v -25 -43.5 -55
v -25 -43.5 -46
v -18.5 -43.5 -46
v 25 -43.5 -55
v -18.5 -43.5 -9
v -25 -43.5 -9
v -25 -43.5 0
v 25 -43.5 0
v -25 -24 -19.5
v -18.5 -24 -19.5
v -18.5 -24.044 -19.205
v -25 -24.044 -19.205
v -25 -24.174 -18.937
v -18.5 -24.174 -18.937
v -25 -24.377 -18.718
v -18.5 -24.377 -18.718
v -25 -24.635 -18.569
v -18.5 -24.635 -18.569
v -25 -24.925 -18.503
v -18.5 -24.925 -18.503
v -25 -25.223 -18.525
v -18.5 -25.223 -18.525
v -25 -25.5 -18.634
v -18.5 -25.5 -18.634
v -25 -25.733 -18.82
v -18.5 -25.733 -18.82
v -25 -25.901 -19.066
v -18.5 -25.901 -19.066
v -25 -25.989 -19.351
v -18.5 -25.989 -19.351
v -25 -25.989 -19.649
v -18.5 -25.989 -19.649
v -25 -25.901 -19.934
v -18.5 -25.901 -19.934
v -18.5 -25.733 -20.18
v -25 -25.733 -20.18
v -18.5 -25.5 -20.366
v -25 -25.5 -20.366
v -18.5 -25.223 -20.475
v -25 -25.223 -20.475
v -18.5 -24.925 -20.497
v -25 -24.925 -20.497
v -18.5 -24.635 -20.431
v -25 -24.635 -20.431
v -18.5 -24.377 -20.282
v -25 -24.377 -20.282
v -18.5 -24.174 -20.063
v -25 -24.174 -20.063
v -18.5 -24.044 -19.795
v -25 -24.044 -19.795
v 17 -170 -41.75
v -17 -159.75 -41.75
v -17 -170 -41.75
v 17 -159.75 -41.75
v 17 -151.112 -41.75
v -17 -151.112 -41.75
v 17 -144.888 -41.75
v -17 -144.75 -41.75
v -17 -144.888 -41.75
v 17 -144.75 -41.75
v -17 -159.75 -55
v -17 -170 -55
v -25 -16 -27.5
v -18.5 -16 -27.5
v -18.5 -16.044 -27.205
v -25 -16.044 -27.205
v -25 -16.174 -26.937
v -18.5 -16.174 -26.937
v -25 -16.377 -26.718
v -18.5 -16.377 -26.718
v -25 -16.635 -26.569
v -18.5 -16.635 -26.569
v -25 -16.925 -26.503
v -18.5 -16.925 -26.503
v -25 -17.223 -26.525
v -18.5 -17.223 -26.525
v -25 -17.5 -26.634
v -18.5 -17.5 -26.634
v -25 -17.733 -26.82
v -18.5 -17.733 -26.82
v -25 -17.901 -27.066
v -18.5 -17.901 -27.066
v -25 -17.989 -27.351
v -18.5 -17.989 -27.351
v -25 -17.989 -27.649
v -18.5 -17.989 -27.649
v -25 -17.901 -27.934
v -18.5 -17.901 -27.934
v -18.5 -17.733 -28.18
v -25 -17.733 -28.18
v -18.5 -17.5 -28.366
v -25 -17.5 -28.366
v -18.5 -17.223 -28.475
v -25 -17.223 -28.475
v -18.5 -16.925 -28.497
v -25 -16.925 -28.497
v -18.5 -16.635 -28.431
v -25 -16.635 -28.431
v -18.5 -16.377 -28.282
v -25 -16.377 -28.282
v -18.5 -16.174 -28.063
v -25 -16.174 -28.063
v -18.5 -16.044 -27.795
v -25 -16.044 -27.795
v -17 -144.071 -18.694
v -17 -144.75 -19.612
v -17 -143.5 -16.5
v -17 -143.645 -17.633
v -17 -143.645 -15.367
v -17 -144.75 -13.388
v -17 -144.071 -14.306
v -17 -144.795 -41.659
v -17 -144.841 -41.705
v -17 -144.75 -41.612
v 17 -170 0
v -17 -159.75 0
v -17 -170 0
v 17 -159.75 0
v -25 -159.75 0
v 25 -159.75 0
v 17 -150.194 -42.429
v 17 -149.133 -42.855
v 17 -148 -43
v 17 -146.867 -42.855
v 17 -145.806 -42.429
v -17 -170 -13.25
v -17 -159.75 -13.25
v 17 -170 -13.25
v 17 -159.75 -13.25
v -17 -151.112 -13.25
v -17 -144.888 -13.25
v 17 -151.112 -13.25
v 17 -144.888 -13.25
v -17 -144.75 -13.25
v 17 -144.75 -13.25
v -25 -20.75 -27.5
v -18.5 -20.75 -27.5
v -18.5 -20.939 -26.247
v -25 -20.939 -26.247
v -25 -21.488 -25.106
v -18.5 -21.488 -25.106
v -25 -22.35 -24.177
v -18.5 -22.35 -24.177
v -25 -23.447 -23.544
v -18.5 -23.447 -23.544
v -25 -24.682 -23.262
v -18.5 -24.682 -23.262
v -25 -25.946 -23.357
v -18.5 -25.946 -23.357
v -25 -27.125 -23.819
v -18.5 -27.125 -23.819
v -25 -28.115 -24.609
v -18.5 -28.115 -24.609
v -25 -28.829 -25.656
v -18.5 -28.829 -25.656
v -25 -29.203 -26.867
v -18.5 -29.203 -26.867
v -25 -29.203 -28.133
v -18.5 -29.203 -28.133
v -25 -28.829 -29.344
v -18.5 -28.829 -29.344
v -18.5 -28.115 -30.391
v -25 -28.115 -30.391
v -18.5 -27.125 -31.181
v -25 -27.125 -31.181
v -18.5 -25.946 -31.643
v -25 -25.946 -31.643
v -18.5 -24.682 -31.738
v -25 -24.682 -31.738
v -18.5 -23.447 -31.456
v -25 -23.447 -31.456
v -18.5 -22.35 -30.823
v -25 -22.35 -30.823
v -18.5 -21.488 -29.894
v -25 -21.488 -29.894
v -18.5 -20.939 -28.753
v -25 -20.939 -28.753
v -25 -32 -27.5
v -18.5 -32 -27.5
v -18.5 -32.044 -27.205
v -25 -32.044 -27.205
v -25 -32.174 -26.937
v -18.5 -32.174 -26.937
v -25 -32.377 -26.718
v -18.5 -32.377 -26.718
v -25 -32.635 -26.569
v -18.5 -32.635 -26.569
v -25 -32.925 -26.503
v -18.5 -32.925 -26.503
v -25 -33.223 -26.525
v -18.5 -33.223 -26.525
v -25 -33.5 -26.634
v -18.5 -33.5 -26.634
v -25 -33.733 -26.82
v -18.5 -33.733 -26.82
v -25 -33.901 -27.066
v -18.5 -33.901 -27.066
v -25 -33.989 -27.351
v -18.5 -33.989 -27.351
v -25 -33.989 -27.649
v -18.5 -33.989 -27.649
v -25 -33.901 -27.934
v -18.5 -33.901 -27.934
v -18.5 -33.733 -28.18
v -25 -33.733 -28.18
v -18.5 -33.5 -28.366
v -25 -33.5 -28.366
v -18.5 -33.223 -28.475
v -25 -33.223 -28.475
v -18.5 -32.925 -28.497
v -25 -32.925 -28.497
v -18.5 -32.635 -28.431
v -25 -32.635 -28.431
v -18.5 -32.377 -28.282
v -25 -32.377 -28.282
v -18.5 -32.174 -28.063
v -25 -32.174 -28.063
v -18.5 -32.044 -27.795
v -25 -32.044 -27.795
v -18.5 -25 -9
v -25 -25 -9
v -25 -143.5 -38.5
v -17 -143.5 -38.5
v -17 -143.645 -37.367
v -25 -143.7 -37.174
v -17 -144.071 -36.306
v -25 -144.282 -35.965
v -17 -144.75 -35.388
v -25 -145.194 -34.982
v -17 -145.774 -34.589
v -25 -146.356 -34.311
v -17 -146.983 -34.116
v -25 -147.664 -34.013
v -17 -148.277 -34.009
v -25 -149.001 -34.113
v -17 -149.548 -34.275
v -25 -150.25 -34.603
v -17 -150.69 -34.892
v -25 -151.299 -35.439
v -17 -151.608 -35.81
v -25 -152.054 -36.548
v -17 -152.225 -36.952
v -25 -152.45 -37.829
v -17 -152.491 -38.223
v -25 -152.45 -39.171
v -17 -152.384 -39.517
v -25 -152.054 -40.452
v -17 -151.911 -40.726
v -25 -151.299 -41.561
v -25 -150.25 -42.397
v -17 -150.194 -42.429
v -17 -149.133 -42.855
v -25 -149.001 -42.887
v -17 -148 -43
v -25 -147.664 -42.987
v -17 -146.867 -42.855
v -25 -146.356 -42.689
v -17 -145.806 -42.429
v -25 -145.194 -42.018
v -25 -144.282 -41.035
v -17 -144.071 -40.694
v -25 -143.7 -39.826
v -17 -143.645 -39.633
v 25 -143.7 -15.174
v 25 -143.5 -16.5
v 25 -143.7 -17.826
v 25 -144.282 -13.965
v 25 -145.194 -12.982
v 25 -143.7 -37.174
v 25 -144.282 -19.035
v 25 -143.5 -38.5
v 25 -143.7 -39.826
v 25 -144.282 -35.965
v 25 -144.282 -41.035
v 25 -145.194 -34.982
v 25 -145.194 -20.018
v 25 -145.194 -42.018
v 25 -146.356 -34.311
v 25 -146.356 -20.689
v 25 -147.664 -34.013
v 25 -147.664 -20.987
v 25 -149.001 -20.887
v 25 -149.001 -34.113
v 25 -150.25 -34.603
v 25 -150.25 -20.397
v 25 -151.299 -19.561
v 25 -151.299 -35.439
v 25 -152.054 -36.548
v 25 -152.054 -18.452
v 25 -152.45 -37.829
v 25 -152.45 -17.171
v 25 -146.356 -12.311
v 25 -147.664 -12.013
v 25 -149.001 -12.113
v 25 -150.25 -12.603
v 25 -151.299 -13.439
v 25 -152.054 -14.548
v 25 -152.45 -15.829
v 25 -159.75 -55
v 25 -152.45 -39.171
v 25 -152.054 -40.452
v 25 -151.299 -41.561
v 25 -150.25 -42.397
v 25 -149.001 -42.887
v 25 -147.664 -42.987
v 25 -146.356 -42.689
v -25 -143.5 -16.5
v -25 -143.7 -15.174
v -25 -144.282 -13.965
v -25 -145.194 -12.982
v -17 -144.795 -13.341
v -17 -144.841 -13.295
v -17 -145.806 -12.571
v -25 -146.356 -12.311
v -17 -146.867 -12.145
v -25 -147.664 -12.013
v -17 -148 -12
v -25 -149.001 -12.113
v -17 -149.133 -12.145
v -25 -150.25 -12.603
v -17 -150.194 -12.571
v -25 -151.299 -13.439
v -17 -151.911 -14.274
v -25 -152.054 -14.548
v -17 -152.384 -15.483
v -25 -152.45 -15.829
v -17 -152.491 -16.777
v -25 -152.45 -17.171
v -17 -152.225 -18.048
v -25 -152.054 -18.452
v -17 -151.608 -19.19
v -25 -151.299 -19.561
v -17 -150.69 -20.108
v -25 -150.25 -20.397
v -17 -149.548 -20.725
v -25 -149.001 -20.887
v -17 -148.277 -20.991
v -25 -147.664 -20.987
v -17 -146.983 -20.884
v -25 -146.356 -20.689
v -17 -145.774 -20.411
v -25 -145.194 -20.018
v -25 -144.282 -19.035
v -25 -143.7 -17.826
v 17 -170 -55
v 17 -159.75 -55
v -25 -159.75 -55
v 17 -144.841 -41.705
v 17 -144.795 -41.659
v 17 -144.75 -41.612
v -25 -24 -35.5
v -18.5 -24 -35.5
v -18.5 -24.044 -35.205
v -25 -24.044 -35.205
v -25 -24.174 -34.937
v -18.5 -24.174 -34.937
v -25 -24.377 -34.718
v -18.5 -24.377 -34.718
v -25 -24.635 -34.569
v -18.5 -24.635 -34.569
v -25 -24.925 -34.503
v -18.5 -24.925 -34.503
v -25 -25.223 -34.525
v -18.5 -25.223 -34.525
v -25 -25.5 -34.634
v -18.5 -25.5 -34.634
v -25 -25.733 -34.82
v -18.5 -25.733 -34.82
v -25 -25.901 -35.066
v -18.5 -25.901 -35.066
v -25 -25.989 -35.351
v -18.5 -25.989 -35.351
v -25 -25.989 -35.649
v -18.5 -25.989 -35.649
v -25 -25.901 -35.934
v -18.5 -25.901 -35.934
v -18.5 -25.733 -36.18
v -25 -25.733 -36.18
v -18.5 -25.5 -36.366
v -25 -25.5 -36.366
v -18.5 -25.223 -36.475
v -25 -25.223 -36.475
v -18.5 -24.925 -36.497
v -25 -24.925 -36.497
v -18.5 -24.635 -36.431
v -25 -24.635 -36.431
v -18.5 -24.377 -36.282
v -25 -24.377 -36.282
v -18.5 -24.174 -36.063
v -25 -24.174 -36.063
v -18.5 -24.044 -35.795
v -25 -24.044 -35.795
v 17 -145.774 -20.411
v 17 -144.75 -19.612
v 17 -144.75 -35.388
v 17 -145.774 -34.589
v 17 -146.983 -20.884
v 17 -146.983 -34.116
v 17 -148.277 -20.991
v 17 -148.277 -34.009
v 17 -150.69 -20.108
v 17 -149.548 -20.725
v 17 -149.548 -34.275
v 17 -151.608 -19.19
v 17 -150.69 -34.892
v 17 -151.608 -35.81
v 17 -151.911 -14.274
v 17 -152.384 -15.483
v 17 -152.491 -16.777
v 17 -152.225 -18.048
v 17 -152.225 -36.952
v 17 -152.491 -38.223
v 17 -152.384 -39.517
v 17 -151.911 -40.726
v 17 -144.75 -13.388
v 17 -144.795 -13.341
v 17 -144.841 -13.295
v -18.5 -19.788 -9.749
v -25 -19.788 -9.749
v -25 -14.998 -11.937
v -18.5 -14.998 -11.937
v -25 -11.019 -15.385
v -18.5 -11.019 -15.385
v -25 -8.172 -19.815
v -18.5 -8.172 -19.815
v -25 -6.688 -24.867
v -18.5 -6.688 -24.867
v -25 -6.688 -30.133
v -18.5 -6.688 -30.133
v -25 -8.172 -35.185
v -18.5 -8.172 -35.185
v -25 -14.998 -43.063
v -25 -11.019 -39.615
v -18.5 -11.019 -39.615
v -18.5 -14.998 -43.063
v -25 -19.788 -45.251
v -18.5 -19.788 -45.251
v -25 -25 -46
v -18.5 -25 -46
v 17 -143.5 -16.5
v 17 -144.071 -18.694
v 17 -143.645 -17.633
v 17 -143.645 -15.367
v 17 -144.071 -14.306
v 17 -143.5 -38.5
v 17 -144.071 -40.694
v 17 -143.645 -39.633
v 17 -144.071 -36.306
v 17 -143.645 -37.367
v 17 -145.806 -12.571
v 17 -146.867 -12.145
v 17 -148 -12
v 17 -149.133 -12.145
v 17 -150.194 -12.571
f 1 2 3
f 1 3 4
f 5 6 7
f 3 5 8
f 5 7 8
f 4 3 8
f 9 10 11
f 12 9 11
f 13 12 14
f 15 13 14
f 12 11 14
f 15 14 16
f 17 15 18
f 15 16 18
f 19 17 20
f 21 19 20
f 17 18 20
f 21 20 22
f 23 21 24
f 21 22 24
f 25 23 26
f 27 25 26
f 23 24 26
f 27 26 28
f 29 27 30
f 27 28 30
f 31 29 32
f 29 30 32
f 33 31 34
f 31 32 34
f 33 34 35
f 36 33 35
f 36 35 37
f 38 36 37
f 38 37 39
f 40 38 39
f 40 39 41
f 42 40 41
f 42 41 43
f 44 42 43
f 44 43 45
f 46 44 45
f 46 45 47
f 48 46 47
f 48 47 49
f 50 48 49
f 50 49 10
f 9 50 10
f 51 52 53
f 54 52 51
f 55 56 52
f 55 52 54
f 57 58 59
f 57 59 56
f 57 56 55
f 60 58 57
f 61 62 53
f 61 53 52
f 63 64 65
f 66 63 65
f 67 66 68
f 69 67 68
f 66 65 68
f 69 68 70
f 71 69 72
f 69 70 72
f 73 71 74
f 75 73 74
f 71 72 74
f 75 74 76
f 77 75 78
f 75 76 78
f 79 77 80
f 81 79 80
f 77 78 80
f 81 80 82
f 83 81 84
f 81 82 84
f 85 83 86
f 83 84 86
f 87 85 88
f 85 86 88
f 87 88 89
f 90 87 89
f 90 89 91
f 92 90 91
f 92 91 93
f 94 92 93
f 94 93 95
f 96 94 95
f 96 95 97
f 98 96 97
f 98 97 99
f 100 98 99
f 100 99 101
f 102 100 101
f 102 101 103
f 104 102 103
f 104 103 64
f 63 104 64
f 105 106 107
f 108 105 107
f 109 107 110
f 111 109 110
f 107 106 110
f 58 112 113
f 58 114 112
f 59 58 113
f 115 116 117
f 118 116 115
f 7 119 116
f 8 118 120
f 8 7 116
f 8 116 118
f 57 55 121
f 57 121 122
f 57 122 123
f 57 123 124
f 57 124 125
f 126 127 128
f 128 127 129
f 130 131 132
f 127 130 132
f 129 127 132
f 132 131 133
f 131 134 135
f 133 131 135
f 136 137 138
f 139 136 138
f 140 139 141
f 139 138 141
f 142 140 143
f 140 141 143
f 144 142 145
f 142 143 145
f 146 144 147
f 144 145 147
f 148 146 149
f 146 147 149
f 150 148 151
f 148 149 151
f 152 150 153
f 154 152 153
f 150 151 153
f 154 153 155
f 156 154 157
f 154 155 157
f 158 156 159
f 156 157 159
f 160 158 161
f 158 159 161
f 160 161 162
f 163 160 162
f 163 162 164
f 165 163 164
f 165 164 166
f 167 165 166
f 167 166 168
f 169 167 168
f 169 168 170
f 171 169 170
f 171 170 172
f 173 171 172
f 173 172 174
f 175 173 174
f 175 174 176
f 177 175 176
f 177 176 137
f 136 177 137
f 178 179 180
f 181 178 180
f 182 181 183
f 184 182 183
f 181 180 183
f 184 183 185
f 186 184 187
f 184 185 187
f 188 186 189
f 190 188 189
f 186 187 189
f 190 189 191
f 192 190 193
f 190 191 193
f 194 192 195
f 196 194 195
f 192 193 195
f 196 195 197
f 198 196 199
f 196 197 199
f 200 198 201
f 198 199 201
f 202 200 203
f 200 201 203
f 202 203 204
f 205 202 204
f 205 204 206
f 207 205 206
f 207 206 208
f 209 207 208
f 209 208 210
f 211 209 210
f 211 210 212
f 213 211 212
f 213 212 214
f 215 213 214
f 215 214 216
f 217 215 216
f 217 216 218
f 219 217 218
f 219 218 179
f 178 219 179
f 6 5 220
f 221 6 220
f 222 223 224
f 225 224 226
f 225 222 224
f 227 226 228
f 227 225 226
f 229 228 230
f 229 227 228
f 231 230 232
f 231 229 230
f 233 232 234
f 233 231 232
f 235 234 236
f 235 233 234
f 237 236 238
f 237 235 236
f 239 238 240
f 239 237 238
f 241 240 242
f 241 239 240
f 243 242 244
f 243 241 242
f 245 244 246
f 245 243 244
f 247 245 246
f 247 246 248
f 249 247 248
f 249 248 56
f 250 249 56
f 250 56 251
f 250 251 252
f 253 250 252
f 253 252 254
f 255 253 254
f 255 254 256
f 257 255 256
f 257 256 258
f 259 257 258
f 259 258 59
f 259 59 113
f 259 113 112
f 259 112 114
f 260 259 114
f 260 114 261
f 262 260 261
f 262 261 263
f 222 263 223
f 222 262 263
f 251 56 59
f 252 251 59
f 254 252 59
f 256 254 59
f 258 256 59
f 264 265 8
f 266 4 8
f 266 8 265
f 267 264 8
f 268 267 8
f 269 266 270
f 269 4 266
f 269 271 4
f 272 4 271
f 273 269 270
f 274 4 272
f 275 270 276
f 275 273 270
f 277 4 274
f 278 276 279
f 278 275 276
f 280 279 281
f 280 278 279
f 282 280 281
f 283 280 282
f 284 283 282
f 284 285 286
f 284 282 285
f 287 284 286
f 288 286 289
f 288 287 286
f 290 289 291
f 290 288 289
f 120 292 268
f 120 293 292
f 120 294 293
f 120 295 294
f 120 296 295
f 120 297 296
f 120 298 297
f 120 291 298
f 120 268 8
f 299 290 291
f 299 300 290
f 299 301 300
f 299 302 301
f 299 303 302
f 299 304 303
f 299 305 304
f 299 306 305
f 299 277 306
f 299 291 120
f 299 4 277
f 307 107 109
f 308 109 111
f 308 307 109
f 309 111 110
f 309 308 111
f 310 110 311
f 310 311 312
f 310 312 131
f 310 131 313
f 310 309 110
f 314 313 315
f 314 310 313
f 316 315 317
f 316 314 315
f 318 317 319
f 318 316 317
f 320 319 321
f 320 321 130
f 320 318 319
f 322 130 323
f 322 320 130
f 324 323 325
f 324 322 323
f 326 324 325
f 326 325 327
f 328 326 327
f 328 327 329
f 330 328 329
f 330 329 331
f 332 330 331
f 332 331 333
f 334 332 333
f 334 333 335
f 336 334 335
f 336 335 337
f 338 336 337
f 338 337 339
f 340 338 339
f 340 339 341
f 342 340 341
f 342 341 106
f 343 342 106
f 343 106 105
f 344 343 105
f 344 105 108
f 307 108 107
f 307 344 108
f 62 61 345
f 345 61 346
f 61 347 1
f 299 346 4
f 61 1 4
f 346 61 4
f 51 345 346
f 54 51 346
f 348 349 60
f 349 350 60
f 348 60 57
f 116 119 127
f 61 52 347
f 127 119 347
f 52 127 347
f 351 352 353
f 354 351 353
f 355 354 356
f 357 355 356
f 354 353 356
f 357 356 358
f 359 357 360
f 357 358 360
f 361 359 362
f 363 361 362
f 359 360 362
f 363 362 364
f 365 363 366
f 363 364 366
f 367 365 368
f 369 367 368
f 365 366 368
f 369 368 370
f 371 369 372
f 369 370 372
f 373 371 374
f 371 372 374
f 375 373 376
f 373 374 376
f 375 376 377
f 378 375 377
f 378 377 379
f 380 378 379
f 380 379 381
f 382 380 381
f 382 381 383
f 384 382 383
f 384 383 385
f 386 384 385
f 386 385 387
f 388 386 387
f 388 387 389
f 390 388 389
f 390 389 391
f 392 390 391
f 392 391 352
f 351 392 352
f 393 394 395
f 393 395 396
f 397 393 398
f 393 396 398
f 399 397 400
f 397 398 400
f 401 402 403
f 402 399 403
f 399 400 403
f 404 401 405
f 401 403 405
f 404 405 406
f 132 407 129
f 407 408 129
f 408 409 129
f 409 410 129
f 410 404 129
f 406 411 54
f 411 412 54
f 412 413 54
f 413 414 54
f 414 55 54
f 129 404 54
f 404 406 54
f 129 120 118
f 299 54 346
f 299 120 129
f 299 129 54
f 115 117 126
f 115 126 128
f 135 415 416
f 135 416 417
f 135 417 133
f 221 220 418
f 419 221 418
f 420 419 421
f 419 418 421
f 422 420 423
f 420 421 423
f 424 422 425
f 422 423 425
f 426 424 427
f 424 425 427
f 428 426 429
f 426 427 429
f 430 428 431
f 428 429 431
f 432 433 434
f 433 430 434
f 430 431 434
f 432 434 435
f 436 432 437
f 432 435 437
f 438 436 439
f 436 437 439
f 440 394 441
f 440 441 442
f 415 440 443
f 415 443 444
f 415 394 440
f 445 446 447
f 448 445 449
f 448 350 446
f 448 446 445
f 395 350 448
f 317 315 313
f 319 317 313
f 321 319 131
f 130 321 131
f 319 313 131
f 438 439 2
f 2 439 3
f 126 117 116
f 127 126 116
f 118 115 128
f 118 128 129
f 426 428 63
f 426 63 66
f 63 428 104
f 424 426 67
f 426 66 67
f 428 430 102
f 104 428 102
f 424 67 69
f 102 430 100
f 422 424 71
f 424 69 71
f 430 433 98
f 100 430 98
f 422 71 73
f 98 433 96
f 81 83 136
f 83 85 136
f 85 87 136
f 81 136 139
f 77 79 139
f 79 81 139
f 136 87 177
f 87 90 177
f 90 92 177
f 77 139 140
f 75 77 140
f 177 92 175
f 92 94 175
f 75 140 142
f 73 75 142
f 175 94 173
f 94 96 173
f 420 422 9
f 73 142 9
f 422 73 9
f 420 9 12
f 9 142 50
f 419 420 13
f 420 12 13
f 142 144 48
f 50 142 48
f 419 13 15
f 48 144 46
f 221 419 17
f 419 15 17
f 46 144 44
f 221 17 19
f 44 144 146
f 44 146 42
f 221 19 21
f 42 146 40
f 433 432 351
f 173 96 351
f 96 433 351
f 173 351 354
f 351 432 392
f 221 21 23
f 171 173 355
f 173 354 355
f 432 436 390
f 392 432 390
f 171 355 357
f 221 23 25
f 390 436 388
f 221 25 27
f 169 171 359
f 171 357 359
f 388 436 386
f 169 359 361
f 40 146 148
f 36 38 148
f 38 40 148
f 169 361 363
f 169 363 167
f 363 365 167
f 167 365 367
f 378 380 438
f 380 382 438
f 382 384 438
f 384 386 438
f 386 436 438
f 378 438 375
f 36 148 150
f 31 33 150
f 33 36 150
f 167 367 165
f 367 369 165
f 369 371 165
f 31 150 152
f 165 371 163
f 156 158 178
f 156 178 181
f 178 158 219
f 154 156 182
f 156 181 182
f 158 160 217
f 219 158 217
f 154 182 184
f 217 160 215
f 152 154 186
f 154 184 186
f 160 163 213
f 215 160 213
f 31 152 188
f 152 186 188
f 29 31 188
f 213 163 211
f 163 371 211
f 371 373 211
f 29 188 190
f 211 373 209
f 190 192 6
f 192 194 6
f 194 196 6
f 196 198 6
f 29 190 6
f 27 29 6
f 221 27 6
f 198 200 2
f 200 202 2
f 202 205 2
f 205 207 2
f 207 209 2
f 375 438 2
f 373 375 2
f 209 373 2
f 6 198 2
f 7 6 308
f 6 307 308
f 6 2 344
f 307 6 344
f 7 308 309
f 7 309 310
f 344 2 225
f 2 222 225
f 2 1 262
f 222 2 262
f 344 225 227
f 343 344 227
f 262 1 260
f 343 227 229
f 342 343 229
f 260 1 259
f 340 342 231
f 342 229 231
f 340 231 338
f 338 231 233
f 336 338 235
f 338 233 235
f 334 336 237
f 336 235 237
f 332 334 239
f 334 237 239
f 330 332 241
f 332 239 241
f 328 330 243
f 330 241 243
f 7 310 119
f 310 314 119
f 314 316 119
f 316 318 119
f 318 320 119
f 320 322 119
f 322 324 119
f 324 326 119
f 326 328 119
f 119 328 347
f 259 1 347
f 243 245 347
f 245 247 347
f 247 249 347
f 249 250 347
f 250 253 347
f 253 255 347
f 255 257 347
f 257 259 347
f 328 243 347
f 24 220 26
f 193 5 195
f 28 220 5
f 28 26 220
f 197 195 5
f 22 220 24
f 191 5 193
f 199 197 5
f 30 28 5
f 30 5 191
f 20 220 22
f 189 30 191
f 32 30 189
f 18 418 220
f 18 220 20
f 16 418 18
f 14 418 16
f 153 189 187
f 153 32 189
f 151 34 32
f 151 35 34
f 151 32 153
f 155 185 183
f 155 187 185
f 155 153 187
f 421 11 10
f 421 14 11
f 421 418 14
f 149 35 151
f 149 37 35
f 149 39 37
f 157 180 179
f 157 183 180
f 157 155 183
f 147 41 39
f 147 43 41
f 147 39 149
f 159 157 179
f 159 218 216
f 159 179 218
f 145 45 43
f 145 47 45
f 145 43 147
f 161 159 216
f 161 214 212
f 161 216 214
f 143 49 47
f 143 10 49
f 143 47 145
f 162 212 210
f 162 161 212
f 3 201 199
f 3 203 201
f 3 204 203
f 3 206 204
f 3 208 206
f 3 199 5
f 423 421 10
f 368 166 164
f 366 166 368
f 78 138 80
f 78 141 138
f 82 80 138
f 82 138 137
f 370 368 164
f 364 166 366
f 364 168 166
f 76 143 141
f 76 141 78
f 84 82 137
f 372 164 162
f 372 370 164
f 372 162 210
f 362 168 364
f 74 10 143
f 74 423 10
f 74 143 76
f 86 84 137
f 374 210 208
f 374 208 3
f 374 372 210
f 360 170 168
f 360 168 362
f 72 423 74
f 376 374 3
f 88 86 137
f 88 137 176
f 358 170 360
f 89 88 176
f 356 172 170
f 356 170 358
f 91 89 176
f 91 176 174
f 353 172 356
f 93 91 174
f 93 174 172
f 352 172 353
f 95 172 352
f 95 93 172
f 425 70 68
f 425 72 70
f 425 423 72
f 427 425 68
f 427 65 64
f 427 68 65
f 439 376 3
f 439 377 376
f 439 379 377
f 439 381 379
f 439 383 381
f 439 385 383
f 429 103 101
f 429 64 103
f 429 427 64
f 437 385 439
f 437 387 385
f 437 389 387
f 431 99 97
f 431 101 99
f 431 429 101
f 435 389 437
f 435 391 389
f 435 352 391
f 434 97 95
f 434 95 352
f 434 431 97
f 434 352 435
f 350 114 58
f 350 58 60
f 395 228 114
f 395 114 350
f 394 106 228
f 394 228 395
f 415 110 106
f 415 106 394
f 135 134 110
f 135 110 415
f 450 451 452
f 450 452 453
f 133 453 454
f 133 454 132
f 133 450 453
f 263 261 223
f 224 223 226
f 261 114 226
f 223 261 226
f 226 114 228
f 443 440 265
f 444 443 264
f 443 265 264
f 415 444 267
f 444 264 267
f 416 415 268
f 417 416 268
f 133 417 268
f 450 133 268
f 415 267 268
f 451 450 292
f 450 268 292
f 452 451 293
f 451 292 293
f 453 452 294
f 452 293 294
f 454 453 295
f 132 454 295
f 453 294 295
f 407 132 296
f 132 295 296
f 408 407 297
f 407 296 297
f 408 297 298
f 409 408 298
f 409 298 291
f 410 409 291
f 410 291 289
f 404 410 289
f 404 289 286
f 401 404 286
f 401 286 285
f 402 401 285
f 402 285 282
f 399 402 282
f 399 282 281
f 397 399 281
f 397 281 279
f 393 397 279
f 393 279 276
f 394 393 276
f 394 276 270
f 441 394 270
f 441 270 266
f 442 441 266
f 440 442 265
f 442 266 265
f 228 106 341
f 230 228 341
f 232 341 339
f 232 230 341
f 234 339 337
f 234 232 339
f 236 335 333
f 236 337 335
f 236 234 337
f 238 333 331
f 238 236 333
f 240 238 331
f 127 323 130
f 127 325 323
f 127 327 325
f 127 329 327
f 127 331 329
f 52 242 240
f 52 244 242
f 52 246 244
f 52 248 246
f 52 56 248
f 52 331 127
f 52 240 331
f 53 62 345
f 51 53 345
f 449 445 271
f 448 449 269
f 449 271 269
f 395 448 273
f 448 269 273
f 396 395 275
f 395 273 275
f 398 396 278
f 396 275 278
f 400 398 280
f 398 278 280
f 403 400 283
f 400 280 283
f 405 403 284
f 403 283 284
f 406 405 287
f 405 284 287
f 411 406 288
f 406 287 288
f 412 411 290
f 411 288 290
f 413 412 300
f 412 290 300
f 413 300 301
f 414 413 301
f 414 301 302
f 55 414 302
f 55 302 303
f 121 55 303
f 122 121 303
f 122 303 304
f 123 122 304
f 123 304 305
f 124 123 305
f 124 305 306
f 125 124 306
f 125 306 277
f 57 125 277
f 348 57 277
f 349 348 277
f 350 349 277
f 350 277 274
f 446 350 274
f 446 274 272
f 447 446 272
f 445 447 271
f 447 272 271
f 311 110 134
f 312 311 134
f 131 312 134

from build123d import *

# Parameters (mm, degrees)
SKETCH1_W               = 50
SKETCH1_H               = 150
BOSS_EXTRUDE1_DEPTH     = 55
CUT_EXTRUDE1_DEPTH      = 168.406690428
CUT_EXTRUDE1_DEPTH_BACK = 45
SKETCH2_R               = 10.25
SKETCH7_R               = 1
SKETCH7_R_2             = 4.25
CUT_EXTRUDE3_DEPTH      = 10
SKETCH8_W               = 55
SKETCH8_H               = 55
SKETCH8_R               = 10.25
BOSS_EXTRUDE2_DEPTH     = 50
SKETCH10_W              = 8
SKETCH10_H              = 10.25
SKETCH10_W_2            = 17
SKETCH10_H_2            = 1
SKETCH10_W_3            = 34
SKETCH10_H_3            = 20
SKETCH10_H_4            = 5
CUT_EXTRUDE4_DEPTH      = 214.717102732
SKETCH11_W              = 34
SKETCH11_H              = 13.25
BOSS_EXTRUDE4_DEPTH     = 25
SKETCH13_W              = 55
SKETCH13_H              = 10
CUT_EXTRUDE5_DEPTH      = 8
SKETCH14_R              = 5.030159043
CUT_EXTRUDE6_DEPTH      = 8
SKETCH15_W              = 34
SKETCH15_H              = 0.25
BOSS_EXTRUDE5_DEPTH     = 13.25
CUT_EXTRUDE7_DEPTH      = 181.416185527
BOSS_EXTRUDE6_START     = 1.5
SKETCH19_R              = 10.25
SKETCH19_R_2            = 1
SKETCH19_R_3            = 4.25
BOSS_EXTRUDE6_DEPTH     = 1.5
CUT_EXTRUDE8_DEPTH      = 184.89467094
SKETCH21_R              = 5.030159043
SKETCH21_R_2            = 4.5
BOSS_EXTRUDE7_DEPTH     = 8


with BuildPart() as part:
    # Sketch1 → Boss-Extrude1 (new body)
    with BuildSketch(Plane.XY):
        with Locations((0, -75)):
            Rectangle(SKETCH1_W, SKETCH1_H)
    extrude(amount=-BOSS_EXTRUDE1_DEPTH)

    # Sketch2 → Cut-Extrude1 (cut, two sides: drawn at the far end of the back side and taken through both)
    with BuildSketch(Plane(origin=(25, 0, 0), x_dir=(0, 0, -1), z_dir=(1, 0, 0)).offset(-CUT_EXTRUDE1_DEPTH_BACK)):
        with Locations(Location((27.5, -25, 0), (0, 0, 270))):
            Circle(SKETCH2_R)
    extrude(amount=CUT_EXTRUDE1_DEPTH + CUT_EXTRUDE1_DEPTH_BACK, mode=Mode.SUBTRACT)

    # Sketch7 → Cut-Extrude3 (cut)
    with BuildSketch(Plane(origin=(-20, 0, 0), x_dir=(0, 0, -1), z_dir=(1, 0, 0))):
        with Locations(Location((27.5, -17, 0), (0, 0, 90))):
            Circle(SKETCH7_R)
        with Locations(Location((35.5, -25, 0), (0, 0, 90))):
            Circle(SKETCH7_R)
        with Locations(Location((27.5, -33, 0), (0, 0, 90))):
            Circle(SKETCH7_R)
        with Locations(Location((19.5, -25, 0), (0, 0, 90))):
            Circle(SKETCH7_R)
        with Locations(Location((27.5, -25, 0), (0, 0, 90))):
            Circle(SKETCH7_R_2)
    extrude(amount=-CUT_EXTRUDE3_DEPTH, mode=Mode.SUBTRACT)

    # Sketch8 → Boss-Extrude2 (add)
    with BuildSketch(Plane(origin=(25, 0, 0), x_dir=(0, 0, -1), z_dir=(1, 0, 0))):
        with Locations((27.5, -177.5)):
            Rectangle(SKETCH8_W, SKETCH8_H)
        with Locations(Location((27.5, -180, 0), (0, 0, 90))):
            Circle(SKETCH8_R, mode=Mode.SUBTRACT)
    extrude(amount=-BOSS_EXTRUDE2_DEPTH)

    # Sketch10 → Cut-Extrude4 (cut, through all)
    with BuildSketch(Plane.XY):
        Polygon((-17, -205), (17, -205), (17, -191.25), (0, -191.25), (-17, -191.25), align=None)
        Polygon((-25, -205), (-17, -205), (-17, -191.25), (-17, -190.25), (-25, -190.25), align=None)
        Polygon((17, -191.25), (17, -205), (25, -205), (25, -190.25), (17, -190.25), align=None)
        with Locations((-21, -185.125)):
            Rectangle(SKETCH10_W, SKETCH10_H)
        with Locations((-21, -174.875)):
            Rectangle(SKETCH10_W, SKETCH10_H)
        with Locations((21, -174.875)):
            Rectangle(SKETCH10_W, SKETCH10_H)
        with Locations((21, -185.125)):
            Rectangle(SKETCH10_W, SKETCH10_H)
        with Locations((-8.5, -185.125)):
            Rectangle(SKETCH10_W_2, SKETCH10_H)
        with Locations((8.5, -185.125)):
            Rectangle(SKETCH10_W_2, SKETCH10_H)
        Polygon((0, -180), (17, -180), (17, -169.75), (-17, -169.75), (-17, -180), align=None)
        with Locations((-8.5, -190.75)):
            Rectangle(SKETCH10_W_2, SKETCH10_H_2)
        with Locations((8.5, -190.75)):
            Rectangle(SKETCH10_W_2, SKETCH10_H_2)
        with Locations((0, -154.75)):
            Rectangle(SKETCH10_W_3, SKETCH10_H_3)
        with Locations((0, -167.25)):
            Rectangle(SKETCH10_W_3, SKETCH10_H_4)
    extrude(amount=-CUT_EXTRUDE4_DEPTH, mode=Mode.SUBTRACT)

    # Sketch11 → Boss-Extrude4 (add)
    with BuildSketch(Plane.XZ.offset(144.75)):
        with Locations((0, -6.625)):
            Rectangle(SKETCH11_W, SKETCH11_H)
        with Locations((0, -48.375)):
            Rectangle(SKETCH11_W, SKETCH11_H)
    extrude(amount=BOSS_EXTRUDE4_DEPTH)

    # Sketch13 → Cut-Extrude5 (cut)
    with BuildSketch(Plane(origin=(25, 0, 0), x_dir=(0, 0, -1), z_dir=(1, 0, 0))):
        with Locations((27.5, -164.75)):
            Rectangle(SKETCH13_W, SKETCH13_H)
    cut_extrude5 = extrude(amount=-CUT_EXTRUDE5_DEPTH, mode=Mode.SUBTRACT)

    # Mirror2: Cut-Extrude5 across plane
    add(cut_extrude5.mirror(Plane(origin=(0, 0, 0), x_dir=(0, 0, 1), z_dir=(1, 0, 0))), mode=Mode.SUBTRACT)

    # Sketch14 → Cut-Extrude6 (cut)
    with BuildSketch(Plane(origin=(25, 0, 0), x_dir=(0, 0, -1), z_dir=(1, 0, 0))):
        with Locations(Location((16.5, -148, 0), (0, 0, 90))):
            Circle(SKETCH14_R)
        with Locations(Location((38.5, -148, 0), (0, 0, 90))):
            Circle(SKETCH14_R)
    cut_extrude6 = extrude(amount=-CUT_EXTRUDE6_DEPTH, mode=Mode.SUBTRACT)

    # Mirror3: Cut-Extrude6 across plane
    add(cut_extrude6.mirror(Plane(origin=(0, 0, 0), x_dir=(0, 0, 1), z_dir=(1, 0, 0))), mode=Mode.SUBTRACT)

    # Sketch15 → Boss-Extrude5 (add)
    with BuildSketch(Plane.XY):
        with Locations((0, -169.875)):
            Rectangle(SKETCH15_W, SKETCH15_H)
    boss_extrude5 = extrude(amount=-BOSS_EXTRUDE5_DEPTH)

    # Mirror4: Boss-Extrude5 across plane
    add(boss_extrude5.mirror(Plane.XY.offset(-27.5)))

    # Sketch16 → Cut-Extrude7 (cut, through all)
    with BuildSketch(Plane.XY):
        Polygon((-18.5, 0), (-18.5, -14.75), (-18.5, -35.25), (-18.5, -43.5), (25, -43.5), (25, 0), align=None)
    extrude(amount=-CUT_EXTRUDE7_DEPTH, mode=Mode.SUBTRACT)

    # Sketch19 → Boss-Extrude6 (add)
    with BuildSketch(Plane(origin=(-20, 0, 0), x_dir=(0, 0, -1), z_dir=(1, 0, 0)).offset(BOSS_EXTRUDE6_START)):
        with Locations((27.5, -25)):
            Circle(SKETCH19_R)
        with Locations(Location((27.5, -17, 0), (0, 0, 90))):
            Circle(SKETCH19_R_2, mode=Mode.SUBTRACT)
        with Locations(Location((27.5, -33, 0), (0, 0, 90))):
            Circle(SKETCH19_R_2, mode=Mode.SUBTRACT)
        with Locations(Location((19.5, -25, 0), (0, 0, 90))):
            Circle(SKETCH19_R_2, mode=Mode.SUBTRACT)
        with Locations(Location((35.5, -25, 0), (0, 0, 90))):
            Circle(SKETCH19_R_2, mode=Mode.SUBTRACT)
        with Locations(Location((27.5, -25, 0), (0, 0, 90))):
            Circle(SKETCH19_R_3, mode=Mode.SUBTRACT)
    extrude(amount=-BOSS_EXTRUDE6_DEPTH)

    # Sketch20 → Cut-Extrude8 (cut, through all)
    with BuildSketch(Plane(origin=(-18.5, 0, 0), x_dir=(0, 0, -1), z_dir=(1, 0, 0))):
        with BuildLine():
            Line((0, 0), (0, -43.5))
            Line((0, -43.5), (9, -43.5))
            Line((9, -43.5), (9, -25))
            ThreePointArc((9, -25), (27.5, -6.5), (46, -25))
            Line((46, -25), (46, -43.5))
            Line((46, -43.5), (55, -43.5))
            Line((55, -43.5), (55, 0))
            Line((55, 0), (0, 0))
        make_face()
    extrude(amount=-CUT_EXTRUDE8_DEPTH, mode=Mode.SUBTRACT)

    # Sketch21 → Boss-Extrude7 (add)
    # profile 1 of 2: a face of its own
    with BuildSketch(Plane(origin=(25, 0, 0), x_dir=(0, 0, -1), z_dir=(1, 0, 0))):
        with Locations(Location((16.5, -148, 0), (0, 0, 229.751587581))):
            Circle(SKETCH21_R)
        with Locations(Location((16.5, -148, 0), (0, 0, 90))):
            Circle(SKETCH21_R_2, mode=Mode.SUBTRACT)
    # profile 2 of 2: a face of its own
    with BuildSketch(Plane(origin=(25, 0, 0), x_dir=(0, 0, -1), z_dir=(1, 0, 0))):
        with Locations(Location((38.5, -148, 0), (0, 0, 310.248412419))):
            Circle(SKETCH21_R)
        with Locations(Location((38.5, -148, 0), (0, 0, 90))):
            Circle(SKETCH21_R_2, mode=Mode.SUBTRACT)
    boss_extrude7 = extrude(amount=-BOSS_EXTRUDE7_DEPTH)

    # Mirror5: Boss-Extrude7 across plane
    add(boss_extrude7.mirror(Plane(origin=(0, 0, 0), x_dir=(0, 0, 1), z_dir=(1, 0, 0))))


solid = part.part
